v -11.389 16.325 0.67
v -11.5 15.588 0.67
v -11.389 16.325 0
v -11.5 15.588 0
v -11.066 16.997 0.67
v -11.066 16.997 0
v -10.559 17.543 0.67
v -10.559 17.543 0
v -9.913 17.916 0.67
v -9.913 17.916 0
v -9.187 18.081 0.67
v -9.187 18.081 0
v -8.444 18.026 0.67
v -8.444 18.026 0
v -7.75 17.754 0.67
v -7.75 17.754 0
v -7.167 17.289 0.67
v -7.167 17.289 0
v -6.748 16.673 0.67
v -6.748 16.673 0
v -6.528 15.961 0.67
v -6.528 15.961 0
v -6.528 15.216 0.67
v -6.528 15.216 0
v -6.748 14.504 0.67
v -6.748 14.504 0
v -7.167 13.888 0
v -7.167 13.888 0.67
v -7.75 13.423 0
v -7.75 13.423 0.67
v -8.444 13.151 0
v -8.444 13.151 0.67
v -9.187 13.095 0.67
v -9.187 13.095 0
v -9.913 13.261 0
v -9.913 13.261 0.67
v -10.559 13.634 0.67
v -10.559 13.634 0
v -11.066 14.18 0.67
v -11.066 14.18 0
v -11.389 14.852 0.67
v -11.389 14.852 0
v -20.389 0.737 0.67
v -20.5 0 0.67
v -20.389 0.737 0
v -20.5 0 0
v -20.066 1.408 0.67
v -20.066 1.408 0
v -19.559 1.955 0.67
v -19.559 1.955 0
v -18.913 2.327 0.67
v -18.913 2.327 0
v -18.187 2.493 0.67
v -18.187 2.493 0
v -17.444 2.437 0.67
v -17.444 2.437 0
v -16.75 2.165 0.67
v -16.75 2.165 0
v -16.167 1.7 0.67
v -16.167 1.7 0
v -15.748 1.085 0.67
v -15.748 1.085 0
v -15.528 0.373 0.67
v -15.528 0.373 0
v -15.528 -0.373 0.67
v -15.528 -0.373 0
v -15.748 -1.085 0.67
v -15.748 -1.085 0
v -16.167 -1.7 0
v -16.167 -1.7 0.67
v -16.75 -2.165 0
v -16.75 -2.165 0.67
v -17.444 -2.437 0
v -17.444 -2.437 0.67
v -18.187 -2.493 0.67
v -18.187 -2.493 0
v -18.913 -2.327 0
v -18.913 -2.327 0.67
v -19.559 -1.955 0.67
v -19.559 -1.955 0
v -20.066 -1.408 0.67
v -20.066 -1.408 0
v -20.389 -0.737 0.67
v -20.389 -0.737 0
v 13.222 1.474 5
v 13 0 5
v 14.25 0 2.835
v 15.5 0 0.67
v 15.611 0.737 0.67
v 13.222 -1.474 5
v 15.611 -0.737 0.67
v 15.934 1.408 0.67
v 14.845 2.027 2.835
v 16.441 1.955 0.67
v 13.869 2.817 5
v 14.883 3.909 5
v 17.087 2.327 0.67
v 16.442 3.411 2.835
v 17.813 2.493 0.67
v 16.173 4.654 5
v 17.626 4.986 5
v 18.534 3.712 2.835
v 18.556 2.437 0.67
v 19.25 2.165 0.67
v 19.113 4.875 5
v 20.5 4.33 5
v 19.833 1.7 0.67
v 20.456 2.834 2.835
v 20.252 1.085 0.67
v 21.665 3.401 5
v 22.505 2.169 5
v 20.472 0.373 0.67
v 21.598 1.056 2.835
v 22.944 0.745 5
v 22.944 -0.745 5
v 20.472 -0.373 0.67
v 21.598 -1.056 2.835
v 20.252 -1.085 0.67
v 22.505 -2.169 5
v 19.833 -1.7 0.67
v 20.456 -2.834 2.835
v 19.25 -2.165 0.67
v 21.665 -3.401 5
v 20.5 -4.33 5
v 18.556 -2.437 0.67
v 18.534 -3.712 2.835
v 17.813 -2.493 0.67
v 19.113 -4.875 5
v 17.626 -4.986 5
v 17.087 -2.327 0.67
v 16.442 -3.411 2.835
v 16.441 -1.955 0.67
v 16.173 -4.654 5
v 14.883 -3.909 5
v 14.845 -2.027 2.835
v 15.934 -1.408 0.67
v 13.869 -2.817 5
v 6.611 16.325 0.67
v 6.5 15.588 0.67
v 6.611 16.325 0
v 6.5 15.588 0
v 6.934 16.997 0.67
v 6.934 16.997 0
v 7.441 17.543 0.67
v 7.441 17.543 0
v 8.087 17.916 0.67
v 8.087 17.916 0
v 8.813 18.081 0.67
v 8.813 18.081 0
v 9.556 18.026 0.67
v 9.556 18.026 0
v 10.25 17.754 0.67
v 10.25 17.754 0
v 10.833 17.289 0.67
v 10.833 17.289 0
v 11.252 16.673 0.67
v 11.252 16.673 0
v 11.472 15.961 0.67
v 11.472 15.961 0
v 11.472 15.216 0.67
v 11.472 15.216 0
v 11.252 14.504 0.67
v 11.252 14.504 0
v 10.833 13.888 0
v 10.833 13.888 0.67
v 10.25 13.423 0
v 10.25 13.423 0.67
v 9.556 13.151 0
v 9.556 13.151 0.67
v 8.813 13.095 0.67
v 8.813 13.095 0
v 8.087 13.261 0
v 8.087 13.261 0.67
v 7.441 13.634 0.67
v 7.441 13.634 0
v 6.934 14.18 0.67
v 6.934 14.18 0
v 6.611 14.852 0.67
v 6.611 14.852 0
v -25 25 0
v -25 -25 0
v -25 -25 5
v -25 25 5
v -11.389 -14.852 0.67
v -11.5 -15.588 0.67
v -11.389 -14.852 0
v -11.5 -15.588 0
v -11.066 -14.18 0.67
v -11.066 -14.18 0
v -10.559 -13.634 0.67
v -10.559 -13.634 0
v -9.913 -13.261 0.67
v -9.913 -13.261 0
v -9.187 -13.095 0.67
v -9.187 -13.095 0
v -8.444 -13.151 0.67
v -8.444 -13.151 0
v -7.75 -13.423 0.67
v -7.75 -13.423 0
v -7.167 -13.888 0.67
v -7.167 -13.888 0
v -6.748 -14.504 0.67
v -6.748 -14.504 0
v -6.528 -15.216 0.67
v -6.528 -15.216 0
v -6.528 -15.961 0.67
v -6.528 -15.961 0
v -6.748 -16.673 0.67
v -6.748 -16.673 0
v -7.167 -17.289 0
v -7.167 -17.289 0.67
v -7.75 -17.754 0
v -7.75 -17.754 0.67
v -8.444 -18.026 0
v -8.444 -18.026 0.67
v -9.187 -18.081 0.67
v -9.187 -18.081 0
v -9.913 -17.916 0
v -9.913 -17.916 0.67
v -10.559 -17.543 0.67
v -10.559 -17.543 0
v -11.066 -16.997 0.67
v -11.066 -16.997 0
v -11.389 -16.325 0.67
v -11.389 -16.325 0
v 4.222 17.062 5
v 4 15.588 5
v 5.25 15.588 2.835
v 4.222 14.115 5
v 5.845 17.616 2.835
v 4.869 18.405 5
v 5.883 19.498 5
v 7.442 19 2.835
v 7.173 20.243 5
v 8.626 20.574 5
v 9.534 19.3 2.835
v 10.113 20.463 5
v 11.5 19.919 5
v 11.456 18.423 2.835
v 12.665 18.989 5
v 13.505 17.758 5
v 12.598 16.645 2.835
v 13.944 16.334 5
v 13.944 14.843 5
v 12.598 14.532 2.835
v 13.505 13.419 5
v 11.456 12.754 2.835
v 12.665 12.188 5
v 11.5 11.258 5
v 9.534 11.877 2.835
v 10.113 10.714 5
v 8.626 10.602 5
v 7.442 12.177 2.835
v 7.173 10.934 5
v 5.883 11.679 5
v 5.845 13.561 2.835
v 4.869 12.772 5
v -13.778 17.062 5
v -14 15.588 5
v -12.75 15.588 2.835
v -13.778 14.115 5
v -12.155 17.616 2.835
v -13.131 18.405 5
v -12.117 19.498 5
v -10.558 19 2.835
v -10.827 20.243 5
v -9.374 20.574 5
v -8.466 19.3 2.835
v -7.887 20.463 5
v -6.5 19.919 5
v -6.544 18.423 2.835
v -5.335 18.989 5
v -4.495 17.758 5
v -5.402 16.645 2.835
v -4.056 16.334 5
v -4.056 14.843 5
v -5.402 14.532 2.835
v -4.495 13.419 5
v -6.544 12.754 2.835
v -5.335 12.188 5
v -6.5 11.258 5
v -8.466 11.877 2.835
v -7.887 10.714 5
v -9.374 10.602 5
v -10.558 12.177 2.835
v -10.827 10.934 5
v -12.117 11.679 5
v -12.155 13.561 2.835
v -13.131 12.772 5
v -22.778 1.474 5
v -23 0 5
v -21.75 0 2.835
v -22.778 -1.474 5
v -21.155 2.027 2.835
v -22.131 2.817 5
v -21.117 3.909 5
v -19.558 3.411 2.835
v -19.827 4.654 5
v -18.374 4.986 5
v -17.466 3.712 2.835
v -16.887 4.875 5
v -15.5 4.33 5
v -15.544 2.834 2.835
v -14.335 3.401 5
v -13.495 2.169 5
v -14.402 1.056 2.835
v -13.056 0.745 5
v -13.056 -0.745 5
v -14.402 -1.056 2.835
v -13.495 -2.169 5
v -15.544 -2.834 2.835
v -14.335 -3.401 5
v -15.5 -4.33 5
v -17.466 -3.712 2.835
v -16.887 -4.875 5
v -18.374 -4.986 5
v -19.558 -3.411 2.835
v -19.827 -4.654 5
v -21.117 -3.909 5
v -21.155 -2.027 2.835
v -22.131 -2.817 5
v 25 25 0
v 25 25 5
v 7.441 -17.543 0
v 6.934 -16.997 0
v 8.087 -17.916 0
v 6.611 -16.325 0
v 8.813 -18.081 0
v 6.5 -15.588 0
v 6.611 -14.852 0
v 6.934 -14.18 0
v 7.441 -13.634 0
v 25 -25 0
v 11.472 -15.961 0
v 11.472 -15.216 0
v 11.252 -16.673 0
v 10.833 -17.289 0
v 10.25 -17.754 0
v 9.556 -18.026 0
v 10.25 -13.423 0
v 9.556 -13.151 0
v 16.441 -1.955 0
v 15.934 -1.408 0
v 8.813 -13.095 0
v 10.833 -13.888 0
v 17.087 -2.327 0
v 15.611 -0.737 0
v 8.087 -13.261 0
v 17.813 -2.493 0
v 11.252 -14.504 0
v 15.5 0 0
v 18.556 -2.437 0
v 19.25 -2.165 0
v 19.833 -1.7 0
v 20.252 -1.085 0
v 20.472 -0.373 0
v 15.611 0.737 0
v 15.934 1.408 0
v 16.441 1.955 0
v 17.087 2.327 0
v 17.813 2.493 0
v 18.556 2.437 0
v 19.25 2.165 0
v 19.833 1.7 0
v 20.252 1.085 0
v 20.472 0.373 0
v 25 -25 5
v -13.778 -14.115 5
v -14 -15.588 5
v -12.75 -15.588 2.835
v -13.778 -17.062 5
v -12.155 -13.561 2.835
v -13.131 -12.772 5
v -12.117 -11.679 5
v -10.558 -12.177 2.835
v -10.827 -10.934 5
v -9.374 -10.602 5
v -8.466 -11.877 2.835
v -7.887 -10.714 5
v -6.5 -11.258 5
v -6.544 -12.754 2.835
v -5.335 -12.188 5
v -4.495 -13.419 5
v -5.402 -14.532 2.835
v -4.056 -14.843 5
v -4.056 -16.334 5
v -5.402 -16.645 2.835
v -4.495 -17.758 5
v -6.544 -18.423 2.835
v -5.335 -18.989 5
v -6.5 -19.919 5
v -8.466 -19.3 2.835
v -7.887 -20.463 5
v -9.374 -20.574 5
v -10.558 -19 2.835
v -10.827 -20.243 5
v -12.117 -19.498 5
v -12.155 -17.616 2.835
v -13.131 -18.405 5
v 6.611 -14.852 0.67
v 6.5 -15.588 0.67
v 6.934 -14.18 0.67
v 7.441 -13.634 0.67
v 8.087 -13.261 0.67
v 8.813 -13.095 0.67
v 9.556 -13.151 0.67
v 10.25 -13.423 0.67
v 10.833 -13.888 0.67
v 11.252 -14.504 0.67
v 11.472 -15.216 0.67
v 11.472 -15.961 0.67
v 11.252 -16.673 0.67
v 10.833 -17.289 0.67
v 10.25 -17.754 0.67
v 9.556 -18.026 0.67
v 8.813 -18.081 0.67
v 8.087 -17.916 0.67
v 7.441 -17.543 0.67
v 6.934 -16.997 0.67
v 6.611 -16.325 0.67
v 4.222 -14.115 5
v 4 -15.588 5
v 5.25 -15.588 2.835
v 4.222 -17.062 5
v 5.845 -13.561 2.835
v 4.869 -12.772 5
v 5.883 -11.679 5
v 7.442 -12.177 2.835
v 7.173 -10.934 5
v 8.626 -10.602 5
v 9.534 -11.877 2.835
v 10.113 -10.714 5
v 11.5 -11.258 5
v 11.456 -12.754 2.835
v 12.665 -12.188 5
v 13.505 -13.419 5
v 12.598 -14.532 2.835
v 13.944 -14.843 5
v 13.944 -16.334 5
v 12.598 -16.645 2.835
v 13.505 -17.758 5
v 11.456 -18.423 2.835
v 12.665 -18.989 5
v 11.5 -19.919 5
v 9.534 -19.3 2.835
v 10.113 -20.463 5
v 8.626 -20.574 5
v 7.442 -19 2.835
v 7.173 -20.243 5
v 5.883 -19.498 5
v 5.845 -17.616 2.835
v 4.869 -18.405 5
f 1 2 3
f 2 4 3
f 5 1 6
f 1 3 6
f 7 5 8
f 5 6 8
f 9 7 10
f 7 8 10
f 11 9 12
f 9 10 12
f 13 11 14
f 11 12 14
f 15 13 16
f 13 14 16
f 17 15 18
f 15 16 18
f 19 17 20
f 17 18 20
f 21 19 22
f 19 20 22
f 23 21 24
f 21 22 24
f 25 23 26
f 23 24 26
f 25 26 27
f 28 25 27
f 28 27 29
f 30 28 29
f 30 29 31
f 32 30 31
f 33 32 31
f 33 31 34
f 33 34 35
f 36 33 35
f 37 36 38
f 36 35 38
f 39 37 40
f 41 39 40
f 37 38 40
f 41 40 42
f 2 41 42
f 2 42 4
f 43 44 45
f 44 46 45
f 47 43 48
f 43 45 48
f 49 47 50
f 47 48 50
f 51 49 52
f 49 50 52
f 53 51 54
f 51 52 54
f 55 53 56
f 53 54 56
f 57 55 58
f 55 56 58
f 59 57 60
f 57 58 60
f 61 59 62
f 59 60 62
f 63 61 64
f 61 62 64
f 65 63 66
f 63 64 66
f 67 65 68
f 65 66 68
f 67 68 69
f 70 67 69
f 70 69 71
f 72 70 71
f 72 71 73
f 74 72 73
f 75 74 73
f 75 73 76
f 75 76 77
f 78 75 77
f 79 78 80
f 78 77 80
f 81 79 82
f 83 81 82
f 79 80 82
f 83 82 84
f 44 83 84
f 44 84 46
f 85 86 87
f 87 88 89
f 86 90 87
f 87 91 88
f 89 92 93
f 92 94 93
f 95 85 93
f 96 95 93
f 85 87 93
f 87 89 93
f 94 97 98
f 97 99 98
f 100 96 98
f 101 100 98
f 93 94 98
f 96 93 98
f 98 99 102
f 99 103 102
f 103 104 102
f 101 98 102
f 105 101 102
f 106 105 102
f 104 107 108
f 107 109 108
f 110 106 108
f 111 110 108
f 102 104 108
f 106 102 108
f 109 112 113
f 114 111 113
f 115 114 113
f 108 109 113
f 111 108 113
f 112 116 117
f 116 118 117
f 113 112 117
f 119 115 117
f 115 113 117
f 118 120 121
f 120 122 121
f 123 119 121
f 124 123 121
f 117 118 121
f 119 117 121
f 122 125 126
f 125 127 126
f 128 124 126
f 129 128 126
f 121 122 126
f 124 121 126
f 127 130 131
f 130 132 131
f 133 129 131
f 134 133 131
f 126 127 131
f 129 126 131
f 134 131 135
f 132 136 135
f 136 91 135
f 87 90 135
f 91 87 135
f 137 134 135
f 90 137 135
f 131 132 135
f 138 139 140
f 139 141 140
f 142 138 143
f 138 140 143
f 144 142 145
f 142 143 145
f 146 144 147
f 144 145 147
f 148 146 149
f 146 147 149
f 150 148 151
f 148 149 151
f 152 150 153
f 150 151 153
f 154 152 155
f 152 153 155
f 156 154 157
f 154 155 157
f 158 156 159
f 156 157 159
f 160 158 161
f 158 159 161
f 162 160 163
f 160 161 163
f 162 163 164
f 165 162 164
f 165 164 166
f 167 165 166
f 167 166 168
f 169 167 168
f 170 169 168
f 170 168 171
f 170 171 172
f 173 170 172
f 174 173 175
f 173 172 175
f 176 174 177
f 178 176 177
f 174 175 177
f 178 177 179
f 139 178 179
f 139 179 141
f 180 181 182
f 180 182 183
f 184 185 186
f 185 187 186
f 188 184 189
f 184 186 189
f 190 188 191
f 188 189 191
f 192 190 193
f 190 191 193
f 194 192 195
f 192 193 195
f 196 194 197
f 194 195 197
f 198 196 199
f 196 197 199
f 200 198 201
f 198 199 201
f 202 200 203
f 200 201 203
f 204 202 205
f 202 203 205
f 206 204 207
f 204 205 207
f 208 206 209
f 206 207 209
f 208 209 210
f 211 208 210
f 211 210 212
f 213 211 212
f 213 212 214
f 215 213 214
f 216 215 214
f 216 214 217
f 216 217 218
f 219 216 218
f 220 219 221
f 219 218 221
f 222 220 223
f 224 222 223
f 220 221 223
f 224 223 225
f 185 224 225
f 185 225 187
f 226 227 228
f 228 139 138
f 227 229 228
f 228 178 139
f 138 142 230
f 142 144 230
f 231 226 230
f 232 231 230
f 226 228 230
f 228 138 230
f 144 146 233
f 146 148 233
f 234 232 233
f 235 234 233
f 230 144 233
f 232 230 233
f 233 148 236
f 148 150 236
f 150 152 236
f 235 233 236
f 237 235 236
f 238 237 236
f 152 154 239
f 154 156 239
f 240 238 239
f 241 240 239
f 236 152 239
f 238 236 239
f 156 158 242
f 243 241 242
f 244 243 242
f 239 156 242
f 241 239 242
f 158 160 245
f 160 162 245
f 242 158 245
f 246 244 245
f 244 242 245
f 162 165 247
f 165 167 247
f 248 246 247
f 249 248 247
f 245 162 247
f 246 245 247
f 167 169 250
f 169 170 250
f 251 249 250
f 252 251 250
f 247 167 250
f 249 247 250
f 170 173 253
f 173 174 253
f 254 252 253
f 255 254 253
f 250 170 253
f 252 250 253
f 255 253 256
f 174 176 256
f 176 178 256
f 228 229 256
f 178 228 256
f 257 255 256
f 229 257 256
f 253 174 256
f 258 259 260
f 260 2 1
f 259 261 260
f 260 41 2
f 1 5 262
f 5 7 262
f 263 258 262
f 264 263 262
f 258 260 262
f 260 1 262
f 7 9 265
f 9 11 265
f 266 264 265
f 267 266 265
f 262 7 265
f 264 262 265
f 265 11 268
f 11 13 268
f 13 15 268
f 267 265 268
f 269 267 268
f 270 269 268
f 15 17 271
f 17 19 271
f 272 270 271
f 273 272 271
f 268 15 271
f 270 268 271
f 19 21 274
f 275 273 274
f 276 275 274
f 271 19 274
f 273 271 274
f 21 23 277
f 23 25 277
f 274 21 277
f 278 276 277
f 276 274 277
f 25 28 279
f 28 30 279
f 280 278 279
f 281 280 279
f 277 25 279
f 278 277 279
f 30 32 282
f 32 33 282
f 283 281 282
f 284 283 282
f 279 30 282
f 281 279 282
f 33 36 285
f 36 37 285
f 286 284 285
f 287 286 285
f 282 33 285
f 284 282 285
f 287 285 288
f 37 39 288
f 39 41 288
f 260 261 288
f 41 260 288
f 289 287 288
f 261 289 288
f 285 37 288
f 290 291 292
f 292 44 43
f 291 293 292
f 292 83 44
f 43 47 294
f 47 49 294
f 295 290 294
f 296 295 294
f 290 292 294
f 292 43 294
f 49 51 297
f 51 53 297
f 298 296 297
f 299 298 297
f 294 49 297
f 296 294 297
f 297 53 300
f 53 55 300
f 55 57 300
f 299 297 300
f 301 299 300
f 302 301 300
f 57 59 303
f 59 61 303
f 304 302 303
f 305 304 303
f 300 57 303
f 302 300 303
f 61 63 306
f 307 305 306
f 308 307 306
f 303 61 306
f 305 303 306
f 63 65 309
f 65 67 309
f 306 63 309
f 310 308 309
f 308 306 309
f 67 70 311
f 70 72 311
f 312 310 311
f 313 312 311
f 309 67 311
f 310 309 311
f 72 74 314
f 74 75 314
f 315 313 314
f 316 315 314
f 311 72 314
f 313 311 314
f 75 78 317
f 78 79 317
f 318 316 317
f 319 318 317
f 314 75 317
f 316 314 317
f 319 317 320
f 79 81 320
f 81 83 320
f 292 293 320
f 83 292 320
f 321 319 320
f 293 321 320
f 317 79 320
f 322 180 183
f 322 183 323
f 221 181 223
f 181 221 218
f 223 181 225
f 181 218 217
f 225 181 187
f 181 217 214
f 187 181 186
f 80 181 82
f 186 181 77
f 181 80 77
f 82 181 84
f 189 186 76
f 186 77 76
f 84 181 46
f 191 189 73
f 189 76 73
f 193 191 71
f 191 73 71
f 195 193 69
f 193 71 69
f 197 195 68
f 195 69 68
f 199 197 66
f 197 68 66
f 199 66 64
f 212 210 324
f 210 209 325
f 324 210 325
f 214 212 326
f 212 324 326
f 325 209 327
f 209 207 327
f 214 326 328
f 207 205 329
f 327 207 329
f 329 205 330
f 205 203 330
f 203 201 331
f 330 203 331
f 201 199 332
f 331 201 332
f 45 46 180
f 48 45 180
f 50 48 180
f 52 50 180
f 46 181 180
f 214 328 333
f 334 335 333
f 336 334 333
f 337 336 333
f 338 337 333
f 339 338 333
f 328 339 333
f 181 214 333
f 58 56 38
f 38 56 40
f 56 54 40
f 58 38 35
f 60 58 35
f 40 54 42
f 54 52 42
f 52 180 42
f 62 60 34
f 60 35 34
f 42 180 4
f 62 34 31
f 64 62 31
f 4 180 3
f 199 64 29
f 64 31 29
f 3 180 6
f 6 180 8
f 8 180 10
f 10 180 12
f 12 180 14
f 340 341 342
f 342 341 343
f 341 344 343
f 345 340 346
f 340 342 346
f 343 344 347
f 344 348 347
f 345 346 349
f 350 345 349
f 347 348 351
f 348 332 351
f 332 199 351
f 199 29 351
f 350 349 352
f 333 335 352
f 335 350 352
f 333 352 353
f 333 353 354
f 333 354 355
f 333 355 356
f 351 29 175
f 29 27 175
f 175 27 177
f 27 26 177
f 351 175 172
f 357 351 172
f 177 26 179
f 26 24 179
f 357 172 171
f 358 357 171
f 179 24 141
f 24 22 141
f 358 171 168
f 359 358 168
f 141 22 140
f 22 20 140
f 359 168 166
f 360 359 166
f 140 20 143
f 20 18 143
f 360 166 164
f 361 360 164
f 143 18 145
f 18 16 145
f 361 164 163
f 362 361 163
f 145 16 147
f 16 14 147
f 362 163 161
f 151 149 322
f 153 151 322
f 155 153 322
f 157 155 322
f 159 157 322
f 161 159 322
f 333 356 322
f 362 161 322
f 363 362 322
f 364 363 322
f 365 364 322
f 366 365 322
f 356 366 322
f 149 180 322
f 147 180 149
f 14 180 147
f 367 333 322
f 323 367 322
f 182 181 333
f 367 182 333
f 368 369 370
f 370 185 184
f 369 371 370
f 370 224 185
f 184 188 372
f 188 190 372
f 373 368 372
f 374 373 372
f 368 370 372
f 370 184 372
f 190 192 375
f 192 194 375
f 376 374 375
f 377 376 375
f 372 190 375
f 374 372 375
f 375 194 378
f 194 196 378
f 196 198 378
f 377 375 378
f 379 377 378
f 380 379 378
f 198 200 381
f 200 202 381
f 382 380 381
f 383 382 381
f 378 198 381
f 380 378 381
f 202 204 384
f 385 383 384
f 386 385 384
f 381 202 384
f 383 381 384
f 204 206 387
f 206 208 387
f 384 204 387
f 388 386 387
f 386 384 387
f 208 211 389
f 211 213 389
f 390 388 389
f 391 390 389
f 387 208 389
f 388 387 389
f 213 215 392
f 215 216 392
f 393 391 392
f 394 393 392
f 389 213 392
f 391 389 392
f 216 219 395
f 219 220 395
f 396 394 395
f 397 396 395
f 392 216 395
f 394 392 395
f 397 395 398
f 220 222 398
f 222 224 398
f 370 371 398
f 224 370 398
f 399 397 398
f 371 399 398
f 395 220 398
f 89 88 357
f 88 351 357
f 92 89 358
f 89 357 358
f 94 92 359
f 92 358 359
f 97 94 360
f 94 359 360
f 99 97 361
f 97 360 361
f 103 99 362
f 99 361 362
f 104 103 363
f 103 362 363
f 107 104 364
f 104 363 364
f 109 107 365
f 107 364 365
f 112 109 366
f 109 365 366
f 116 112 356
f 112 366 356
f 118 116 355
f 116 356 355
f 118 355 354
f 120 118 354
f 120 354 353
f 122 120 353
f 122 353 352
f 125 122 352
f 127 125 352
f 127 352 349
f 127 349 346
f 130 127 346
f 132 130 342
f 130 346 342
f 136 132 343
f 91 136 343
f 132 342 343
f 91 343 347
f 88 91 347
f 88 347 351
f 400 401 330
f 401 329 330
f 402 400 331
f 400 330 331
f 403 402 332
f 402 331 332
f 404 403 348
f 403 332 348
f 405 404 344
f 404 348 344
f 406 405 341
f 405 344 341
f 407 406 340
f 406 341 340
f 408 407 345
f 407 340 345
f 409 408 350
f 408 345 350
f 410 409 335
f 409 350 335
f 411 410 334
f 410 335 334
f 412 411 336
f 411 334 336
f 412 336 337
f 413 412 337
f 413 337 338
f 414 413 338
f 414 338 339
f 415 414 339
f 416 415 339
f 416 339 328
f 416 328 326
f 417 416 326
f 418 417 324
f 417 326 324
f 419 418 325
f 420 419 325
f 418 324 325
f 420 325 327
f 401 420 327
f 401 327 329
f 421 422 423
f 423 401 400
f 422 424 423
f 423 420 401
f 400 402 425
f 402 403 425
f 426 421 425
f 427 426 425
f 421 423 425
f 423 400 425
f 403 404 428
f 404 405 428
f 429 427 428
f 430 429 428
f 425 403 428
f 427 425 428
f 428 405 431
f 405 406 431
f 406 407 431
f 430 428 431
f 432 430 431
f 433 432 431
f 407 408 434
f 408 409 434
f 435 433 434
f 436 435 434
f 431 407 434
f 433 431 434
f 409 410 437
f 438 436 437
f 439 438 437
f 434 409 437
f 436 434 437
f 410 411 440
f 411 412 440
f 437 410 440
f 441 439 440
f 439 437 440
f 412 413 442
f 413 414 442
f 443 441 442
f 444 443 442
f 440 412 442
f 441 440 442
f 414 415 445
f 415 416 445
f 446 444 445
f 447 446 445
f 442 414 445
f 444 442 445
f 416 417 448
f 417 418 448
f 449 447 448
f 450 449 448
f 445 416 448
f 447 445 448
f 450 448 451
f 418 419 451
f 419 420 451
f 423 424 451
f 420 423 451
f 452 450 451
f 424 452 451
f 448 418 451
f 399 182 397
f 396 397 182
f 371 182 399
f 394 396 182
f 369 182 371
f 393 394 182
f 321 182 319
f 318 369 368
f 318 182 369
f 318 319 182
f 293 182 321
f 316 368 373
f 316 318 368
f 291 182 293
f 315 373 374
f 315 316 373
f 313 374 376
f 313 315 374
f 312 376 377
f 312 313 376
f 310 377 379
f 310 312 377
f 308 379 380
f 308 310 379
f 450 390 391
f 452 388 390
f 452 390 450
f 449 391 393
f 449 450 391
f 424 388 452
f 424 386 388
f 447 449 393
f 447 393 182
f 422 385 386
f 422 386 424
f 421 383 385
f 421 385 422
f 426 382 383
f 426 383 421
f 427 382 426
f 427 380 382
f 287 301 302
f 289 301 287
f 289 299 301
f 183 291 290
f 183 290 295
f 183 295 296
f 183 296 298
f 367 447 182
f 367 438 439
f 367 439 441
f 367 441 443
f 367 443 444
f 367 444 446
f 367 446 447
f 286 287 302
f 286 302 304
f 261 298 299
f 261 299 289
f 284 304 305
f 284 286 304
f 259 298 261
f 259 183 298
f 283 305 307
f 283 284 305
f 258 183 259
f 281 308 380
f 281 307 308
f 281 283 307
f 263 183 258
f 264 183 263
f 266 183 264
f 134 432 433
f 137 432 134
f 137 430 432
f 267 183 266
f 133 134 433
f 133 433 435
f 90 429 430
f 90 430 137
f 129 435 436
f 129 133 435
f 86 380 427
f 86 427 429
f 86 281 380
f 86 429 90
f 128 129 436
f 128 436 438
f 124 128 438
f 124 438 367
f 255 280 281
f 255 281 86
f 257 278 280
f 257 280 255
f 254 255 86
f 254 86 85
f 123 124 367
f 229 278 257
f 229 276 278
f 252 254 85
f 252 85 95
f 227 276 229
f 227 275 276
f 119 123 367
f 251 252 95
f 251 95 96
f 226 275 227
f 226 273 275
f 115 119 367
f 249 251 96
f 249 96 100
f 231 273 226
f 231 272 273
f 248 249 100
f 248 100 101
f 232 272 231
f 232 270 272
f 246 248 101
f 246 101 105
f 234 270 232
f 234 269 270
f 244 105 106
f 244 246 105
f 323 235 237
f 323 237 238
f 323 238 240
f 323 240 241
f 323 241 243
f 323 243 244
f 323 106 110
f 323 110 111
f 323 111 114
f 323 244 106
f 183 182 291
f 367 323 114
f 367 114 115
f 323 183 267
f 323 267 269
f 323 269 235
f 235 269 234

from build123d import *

# Parameters (mm, degrees)
F0_W           = 50
F0_H           = 50
F1_DEPTH       = 5
F3_D           = 5
F3_DEPTH       = 12
F3_CSINK_D     = 10
F3_CSINK_ANGLE = 60


with BuildPart() as f1:
    # F0 (on Top) → F1 (new body)
    with BuildSketch(Plane.XY):
        Rectangle(F0_W, F0_H)
    extrude(amount=F1_DEPTH)

    # F3
    with Locations(Plane.XY.offset(5)):
        with Locations((9, 15.588457), (18, 0), (9, -15.588457), (-9, -15.588457), (-18, 0), (-9, 15.588457)):
            CounterSinkHole(F3_D / 2, F3_CSINK_D / 2, depth=F3_DEPTH, counter_sink_angle=F3_CSINK_ANGLE)


solid = f1.part
